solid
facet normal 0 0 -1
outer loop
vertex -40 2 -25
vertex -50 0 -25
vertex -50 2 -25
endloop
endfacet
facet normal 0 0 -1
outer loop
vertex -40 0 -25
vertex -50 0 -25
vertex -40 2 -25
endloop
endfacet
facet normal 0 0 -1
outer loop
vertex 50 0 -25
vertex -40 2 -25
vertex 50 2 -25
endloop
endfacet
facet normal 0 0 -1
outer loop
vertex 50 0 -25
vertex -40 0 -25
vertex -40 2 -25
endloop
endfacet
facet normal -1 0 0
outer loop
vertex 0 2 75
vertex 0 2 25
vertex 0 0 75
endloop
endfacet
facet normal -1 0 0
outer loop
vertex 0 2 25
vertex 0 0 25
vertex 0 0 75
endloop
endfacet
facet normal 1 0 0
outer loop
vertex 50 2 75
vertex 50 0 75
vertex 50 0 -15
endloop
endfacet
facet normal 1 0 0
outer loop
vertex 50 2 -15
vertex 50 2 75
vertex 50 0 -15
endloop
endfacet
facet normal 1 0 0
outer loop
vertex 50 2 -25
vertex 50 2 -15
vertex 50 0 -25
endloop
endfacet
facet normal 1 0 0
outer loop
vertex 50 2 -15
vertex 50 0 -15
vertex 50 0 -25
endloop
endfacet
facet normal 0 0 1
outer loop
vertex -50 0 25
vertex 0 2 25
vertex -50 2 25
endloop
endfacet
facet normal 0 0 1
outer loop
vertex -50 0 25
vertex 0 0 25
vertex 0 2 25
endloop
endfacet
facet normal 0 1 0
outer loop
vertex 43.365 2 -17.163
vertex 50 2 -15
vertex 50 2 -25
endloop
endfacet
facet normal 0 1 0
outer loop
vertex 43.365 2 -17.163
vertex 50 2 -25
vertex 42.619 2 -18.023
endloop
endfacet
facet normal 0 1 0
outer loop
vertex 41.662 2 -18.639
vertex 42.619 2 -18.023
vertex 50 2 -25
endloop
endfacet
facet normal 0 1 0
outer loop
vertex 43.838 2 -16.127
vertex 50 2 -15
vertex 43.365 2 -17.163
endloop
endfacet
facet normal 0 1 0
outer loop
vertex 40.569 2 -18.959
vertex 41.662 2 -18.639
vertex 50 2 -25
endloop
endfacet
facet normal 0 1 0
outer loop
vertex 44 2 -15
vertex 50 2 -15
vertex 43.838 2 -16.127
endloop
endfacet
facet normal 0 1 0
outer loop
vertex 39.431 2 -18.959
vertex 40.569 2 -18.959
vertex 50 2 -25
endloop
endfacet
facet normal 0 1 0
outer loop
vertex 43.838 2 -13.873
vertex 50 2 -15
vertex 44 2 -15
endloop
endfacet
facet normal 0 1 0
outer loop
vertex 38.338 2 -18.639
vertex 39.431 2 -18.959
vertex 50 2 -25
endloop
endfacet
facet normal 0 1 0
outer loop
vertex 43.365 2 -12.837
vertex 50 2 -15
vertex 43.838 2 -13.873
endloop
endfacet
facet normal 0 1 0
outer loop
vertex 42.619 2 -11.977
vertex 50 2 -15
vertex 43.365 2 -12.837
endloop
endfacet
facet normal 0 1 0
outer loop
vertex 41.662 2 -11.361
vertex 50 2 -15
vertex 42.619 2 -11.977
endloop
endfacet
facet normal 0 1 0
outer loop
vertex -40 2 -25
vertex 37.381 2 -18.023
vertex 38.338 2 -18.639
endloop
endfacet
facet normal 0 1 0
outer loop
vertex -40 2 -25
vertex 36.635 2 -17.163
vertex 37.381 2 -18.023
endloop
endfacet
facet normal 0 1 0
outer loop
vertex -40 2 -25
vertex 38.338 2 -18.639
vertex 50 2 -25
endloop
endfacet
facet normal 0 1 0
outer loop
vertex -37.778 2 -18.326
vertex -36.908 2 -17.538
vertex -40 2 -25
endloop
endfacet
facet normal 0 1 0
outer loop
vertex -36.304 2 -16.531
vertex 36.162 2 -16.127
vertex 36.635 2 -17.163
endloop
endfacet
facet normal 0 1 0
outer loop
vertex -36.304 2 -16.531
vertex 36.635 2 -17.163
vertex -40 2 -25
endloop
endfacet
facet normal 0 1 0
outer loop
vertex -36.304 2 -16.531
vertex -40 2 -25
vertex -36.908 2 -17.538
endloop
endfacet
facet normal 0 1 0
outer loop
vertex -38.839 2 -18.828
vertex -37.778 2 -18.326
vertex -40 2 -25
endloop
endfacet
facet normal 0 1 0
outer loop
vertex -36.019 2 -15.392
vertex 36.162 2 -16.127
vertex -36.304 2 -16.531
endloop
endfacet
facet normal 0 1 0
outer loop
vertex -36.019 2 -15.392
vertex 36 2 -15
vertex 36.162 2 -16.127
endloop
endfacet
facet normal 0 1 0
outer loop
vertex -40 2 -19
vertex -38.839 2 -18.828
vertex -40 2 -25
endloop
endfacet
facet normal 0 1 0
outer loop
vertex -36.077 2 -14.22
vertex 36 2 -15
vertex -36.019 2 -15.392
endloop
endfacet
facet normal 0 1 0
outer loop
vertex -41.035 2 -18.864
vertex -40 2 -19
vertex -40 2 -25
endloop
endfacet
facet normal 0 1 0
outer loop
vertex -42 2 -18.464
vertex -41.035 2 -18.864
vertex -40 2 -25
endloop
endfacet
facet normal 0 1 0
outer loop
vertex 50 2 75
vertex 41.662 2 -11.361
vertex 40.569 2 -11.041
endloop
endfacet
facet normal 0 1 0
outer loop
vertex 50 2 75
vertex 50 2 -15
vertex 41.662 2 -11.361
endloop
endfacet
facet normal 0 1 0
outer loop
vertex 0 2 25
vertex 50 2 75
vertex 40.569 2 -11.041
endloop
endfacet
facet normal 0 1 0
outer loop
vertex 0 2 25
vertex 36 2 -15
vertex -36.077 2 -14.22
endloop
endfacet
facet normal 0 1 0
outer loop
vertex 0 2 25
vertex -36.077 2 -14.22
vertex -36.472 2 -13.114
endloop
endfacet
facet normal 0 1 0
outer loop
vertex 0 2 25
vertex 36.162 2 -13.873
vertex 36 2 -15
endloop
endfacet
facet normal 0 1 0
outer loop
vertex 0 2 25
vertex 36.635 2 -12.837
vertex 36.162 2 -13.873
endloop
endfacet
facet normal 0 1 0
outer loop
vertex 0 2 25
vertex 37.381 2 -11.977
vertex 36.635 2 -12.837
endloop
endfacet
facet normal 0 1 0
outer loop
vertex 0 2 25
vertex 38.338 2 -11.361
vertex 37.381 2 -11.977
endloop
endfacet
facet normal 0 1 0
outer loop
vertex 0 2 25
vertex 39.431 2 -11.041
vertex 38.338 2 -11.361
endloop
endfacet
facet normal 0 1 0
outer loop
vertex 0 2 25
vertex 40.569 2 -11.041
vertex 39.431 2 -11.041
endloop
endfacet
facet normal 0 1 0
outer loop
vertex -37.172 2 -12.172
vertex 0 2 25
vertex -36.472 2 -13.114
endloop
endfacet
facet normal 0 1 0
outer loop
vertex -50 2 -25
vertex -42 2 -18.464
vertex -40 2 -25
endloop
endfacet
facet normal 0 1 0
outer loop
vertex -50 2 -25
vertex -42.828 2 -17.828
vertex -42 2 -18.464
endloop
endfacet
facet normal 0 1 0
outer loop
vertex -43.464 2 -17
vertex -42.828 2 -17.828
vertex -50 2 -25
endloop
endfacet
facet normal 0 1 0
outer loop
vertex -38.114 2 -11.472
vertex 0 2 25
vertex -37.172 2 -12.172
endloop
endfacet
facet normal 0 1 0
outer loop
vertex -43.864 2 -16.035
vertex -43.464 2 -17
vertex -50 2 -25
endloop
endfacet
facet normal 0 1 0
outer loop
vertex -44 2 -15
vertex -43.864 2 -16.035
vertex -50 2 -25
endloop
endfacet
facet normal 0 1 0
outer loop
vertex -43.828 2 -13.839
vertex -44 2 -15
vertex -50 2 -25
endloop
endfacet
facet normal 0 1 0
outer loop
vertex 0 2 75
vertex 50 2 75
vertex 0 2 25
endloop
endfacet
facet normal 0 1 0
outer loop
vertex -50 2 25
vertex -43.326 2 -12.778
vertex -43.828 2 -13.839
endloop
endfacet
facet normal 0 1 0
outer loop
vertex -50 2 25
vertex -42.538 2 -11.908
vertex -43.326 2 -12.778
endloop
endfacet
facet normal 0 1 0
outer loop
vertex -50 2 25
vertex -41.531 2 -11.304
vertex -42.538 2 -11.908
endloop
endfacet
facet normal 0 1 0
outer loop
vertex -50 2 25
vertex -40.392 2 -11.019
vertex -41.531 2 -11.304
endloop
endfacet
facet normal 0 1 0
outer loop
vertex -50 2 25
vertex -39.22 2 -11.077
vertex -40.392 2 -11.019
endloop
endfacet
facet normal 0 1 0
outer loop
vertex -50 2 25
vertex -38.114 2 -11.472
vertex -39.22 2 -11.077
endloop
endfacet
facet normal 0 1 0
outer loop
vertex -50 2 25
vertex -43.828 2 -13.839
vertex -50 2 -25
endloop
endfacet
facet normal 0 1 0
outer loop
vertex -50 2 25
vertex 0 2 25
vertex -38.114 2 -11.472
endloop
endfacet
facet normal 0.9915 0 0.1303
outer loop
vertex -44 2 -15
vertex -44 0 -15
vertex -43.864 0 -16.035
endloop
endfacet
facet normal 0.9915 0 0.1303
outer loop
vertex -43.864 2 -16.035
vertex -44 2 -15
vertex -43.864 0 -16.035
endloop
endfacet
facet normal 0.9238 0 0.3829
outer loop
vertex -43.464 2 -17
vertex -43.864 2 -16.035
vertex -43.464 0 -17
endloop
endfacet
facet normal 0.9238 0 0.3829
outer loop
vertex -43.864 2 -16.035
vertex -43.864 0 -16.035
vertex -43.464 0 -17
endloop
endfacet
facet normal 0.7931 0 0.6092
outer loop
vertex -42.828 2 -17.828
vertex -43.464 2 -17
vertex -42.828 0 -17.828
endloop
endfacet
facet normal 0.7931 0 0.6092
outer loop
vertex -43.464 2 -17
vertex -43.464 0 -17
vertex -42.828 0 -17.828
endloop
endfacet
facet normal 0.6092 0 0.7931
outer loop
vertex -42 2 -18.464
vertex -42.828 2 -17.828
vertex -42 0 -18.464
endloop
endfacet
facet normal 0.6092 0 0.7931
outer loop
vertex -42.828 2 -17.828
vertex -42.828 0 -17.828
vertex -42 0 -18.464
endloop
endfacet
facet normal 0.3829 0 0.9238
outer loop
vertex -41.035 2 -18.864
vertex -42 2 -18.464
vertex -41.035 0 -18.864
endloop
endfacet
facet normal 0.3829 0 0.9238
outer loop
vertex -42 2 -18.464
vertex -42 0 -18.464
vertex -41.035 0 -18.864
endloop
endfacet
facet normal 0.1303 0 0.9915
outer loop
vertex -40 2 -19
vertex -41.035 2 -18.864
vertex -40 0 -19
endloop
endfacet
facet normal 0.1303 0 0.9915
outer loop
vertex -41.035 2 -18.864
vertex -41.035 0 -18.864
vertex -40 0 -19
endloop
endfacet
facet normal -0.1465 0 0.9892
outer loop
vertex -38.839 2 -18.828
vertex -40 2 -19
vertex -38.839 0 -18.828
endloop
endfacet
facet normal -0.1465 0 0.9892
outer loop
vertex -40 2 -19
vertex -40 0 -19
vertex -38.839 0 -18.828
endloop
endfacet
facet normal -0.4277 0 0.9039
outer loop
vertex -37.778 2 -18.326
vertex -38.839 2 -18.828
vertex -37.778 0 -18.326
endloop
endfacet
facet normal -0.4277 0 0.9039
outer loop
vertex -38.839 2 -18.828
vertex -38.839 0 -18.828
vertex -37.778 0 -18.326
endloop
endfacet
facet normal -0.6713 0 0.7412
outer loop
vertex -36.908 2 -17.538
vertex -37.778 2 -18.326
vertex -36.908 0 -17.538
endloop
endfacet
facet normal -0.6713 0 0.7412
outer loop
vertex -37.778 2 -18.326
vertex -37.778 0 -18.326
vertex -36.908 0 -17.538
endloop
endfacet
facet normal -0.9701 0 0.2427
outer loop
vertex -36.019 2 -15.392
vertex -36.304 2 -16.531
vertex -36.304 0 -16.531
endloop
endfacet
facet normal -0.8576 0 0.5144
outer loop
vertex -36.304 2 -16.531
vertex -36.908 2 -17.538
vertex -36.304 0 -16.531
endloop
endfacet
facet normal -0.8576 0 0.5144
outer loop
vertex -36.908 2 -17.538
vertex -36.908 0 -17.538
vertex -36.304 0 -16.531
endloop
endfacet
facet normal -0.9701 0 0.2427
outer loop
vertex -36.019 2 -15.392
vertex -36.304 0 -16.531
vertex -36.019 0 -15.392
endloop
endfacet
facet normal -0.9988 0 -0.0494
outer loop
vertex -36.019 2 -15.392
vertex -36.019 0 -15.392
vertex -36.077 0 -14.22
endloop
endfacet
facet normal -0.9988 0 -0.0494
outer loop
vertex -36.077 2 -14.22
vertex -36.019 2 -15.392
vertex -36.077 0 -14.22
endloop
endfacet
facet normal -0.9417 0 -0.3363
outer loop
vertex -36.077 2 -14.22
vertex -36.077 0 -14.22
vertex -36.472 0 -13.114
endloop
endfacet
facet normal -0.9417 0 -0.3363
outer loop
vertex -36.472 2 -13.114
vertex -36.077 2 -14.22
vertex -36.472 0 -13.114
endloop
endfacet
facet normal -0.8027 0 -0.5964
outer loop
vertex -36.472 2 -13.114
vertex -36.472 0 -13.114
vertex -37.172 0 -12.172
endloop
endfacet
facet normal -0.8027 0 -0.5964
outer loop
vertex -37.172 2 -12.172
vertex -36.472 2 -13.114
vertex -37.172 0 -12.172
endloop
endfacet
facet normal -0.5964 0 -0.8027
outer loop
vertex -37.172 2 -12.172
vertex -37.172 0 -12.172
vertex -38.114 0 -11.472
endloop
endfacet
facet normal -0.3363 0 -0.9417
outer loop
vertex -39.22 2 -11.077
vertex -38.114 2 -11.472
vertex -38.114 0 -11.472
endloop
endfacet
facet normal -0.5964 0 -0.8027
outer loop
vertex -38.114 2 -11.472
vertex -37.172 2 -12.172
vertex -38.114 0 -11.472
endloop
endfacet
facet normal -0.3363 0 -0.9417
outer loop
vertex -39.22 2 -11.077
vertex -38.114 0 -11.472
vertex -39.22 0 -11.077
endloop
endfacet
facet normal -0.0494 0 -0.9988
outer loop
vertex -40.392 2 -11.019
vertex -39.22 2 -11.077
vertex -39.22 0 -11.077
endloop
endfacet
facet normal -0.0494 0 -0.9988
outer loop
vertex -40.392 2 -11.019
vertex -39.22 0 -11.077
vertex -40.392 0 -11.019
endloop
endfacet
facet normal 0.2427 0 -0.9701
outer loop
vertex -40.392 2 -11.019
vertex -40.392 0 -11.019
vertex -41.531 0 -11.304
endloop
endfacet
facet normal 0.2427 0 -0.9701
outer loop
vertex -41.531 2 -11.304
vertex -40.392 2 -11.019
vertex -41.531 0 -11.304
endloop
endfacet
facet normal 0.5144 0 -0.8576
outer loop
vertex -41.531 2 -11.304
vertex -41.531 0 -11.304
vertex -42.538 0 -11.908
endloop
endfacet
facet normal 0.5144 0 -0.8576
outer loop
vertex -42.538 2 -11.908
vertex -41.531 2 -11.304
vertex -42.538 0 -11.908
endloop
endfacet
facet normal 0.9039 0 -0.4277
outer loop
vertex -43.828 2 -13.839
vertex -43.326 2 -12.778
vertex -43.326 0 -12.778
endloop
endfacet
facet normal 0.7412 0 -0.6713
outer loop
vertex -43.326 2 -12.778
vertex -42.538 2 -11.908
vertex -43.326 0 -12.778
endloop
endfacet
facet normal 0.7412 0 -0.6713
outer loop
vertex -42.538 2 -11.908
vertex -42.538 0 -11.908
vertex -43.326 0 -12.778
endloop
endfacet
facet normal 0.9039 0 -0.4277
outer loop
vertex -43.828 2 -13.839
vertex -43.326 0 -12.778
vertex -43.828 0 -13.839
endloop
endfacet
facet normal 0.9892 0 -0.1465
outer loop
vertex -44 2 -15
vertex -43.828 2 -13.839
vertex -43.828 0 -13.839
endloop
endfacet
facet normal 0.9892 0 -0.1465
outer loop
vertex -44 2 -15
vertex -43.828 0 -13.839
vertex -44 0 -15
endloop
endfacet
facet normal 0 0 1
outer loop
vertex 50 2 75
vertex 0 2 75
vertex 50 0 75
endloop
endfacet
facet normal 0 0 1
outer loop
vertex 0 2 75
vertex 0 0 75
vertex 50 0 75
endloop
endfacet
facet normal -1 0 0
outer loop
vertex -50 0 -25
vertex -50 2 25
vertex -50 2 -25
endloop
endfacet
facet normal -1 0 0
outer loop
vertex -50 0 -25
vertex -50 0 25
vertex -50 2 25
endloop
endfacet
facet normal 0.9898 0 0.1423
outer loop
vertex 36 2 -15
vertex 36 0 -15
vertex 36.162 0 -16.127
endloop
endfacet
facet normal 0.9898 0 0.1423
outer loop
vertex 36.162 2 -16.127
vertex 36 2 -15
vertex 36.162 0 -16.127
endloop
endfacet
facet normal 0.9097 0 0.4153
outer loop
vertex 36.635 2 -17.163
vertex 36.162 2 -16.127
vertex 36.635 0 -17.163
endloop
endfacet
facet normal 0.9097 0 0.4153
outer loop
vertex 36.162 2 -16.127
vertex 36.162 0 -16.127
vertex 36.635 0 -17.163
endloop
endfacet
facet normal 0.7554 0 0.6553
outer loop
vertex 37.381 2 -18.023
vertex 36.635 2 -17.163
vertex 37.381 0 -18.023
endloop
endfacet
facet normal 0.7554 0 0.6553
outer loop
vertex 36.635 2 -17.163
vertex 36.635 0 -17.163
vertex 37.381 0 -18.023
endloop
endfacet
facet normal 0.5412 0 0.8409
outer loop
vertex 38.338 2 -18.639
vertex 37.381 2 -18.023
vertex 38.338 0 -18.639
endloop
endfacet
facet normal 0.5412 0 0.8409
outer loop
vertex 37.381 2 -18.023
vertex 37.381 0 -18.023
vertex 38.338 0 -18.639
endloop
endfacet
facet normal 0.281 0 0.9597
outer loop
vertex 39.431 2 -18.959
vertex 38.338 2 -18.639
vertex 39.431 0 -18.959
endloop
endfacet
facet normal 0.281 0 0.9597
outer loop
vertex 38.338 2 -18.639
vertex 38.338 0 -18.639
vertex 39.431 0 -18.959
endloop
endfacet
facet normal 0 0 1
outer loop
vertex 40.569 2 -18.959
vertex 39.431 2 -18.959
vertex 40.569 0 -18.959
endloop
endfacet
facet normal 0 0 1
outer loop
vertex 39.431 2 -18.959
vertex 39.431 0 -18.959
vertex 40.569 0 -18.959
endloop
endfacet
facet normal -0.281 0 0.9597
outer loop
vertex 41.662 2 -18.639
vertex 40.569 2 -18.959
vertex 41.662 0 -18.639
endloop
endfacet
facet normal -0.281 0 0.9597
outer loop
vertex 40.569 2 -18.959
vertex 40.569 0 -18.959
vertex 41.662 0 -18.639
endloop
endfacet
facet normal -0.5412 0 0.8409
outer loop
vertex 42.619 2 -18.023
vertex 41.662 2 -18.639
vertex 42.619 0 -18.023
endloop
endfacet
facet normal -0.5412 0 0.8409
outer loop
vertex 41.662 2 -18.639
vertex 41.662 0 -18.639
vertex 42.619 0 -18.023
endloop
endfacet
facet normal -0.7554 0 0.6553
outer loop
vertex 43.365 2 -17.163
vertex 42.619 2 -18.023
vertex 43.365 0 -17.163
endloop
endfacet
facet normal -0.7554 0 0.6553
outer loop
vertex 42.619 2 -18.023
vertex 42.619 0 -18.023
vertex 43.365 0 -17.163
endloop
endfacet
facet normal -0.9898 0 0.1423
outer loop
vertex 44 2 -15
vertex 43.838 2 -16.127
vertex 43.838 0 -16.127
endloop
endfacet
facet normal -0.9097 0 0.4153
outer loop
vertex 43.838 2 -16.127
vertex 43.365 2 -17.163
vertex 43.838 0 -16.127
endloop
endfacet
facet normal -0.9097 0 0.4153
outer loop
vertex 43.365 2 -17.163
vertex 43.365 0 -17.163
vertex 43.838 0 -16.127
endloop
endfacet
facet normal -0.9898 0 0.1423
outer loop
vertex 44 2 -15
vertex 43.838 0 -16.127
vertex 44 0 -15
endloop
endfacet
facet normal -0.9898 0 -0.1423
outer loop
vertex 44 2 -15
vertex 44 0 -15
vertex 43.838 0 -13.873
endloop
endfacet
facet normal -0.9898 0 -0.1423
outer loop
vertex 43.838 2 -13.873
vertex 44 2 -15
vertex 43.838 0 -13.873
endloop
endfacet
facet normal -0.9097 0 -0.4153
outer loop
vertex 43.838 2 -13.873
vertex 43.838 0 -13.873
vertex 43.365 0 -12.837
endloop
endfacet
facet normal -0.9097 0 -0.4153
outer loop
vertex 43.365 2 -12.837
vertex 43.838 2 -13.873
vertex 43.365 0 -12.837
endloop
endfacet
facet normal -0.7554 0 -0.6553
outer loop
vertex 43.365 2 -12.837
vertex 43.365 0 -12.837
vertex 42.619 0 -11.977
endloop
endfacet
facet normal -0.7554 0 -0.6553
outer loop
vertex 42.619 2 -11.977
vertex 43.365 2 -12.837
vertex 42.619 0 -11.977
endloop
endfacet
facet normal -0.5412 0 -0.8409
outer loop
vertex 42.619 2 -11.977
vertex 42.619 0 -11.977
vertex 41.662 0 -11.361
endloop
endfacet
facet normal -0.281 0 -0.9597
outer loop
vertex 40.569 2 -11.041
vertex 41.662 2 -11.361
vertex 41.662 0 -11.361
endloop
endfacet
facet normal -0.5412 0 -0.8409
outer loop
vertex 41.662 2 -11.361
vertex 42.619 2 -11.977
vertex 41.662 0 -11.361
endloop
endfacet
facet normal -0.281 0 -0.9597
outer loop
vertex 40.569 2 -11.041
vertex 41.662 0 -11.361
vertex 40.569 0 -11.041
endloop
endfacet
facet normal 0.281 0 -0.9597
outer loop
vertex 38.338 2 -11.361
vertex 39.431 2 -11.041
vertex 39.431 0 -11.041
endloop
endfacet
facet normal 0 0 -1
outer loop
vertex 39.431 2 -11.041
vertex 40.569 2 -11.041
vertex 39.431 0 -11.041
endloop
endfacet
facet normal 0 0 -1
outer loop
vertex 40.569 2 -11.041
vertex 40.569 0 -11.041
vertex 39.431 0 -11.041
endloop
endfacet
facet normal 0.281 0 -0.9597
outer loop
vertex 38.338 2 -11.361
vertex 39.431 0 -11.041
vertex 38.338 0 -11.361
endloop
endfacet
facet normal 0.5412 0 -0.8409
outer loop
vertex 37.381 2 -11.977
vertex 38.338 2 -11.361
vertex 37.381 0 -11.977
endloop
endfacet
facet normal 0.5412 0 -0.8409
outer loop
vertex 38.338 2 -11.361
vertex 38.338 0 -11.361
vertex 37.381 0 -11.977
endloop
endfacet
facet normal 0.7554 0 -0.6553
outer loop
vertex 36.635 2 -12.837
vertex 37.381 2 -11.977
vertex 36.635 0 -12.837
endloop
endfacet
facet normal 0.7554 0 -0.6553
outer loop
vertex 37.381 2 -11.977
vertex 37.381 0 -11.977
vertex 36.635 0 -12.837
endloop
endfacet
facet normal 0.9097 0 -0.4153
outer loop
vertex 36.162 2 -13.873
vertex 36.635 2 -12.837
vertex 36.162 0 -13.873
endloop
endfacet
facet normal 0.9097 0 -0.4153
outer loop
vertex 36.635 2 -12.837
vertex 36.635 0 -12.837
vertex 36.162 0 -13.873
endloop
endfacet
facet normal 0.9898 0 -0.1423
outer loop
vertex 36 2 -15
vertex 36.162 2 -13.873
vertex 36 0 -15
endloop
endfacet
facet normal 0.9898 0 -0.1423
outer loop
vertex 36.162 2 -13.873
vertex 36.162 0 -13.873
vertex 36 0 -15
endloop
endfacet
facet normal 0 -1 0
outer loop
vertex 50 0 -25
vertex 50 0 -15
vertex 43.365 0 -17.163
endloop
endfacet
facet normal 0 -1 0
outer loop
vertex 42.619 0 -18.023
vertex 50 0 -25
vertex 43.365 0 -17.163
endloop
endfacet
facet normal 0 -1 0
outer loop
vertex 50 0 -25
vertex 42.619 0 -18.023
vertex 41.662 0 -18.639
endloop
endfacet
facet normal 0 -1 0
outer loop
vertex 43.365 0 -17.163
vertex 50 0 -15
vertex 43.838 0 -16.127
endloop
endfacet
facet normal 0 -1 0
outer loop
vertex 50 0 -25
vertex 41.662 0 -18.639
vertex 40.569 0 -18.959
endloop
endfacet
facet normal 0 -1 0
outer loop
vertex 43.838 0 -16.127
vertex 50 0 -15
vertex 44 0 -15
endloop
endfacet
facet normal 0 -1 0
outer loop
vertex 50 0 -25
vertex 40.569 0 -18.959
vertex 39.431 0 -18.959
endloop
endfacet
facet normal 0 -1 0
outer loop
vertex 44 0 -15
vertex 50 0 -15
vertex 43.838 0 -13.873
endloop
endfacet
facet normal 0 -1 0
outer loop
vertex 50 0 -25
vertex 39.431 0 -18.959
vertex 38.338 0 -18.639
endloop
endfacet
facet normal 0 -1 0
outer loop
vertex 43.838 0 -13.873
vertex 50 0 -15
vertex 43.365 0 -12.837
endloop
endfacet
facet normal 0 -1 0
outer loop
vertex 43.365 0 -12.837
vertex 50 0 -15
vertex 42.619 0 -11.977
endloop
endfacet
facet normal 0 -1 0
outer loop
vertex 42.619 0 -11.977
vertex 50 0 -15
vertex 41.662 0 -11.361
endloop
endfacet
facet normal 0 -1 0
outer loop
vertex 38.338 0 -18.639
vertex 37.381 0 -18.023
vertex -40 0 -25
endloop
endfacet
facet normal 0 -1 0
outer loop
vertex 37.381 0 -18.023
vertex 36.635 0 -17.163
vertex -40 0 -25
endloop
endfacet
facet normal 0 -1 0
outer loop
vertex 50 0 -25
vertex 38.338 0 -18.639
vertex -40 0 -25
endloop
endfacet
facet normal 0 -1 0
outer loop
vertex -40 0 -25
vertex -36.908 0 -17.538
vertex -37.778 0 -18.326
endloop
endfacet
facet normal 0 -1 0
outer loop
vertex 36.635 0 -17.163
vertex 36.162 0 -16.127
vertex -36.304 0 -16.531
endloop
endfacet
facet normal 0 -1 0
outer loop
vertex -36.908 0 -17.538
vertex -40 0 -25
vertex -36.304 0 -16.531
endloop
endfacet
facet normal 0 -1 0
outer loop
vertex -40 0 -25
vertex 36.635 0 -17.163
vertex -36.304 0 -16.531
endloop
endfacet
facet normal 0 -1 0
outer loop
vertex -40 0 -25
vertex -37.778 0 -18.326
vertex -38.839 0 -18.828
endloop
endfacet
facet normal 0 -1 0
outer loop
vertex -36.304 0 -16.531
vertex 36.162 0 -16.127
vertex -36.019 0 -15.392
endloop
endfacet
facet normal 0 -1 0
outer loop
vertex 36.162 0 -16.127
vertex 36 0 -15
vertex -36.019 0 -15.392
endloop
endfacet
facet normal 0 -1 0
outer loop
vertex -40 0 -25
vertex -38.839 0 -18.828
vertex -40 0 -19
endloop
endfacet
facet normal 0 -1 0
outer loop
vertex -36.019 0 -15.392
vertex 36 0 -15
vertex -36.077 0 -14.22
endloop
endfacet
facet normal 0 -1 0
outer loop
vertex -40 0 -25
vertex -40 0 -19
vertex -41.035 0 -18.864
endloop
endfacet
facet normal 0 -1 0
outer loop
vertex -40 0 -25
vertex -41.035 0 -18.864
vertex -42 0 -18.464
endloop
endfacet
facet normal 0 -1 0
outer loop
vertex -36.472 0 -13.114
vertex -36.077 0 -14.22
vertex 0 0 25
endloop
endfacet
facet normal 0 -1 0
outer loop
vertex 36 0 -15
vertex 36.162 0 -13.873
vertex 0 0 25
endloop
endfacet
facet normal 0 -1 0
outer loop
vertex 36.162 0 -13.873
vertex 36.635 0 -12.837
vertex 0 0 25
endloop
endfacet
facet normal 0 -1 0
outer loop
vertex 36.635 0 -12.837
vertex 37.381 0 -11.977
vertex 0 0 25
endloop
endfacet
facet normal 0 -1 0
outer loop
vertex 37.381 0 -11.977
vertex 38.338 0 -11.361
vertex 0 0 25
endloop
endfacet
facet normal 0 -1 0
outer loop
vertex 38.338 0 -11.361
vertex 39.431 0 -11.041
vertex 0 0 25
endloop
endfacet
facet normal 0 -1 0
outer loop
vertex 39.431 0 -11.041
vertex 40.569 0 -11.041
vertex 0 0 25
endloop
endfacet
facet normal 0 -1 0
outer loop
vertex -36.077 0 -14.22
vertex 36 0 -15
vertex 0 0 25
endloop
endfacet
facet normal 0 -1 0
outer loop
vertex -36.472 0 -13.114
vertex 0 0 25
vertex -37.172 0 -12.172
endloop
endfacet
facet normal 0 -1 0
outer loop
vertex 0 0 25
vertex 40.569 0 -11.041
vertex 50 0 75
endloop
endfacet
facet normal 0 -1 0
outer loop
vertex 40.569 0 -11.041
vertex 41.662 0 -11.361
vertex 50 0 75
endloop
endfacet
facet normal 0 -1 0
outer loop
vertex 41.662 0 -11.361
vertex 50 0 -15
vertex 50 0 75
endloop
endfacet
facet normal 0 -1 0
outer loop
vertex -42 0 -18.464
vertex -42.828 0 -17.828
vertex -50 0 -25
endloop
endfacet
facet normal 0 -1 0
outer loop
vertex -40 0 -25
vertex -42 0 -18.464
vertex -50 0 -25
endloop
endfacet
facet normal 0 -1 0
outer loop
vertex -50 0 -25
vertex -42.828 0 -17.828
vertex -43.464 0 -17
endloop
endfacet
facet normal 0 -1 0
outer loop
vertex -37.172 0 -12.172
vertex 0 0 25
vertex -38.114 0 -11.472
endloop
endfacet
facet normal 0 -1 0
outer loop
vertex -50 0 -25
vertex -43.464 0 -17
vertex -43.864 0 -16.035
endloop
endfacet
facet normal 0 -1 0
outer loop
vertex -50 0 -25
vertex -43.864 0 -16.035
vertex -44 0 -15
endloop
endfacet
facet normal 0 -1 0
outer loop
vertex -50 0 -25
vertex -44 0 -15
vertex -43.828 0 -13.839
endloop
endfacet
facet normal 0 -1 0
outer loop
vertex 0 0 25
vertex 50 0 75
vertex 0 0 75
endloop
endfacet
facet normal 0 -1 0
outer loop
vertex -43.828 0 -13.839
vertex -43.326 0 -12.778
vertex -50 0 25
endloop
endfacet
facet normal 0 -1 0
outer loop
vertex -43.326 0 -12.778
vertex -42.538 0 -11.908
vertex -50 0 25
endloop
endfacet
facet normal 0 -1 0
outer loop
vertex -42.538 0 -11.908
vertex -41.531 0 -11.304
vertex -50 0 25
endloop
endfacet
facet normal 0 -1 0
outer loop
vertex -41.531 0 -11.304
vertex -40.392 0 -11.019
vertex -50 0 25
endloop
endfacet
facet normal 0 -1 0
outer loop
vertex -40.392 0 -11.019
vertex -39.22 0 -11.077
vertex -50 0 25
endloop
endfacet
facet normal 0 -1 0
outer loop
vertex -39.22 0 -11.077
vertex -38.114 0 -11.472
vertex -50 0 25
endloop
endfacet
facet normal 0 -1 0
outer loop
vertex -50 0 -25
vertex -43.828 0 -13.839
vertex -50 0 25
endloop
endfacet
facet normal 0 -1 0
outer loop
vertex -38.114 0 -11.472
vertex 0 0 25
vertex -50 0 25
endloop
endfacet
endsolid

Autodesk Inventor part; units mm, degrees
ref_plane "YZ Plane" through (0, 0, 0) normal (1, 0, 0) x (0, 1, 0)
ref_plane "XZ Plane" through (0, 0, 0) normal (0, 1, 0) x (-1, 0, 0)
ref_plane "XY Plane" through (0, 0, 0) normal (0, 0, 1) x (1, 0, 0)
sketch "Sketch1" plane through (0, 0, 0) normal (0, 1, 0) x (-1, 0, 0)
  line L0 (-50, 25) -> (50, 25)
  line L1 (50, 25) -> (50, -25)
  line L2 (50, -25) -> (-50, -25)
  line L3 (-50, -25) -> (-50, 25)
  line L4 (-50, 25) -> (0, 25)
  line L5 (0, 25) -> (0, 75)
  line L6 (0, 75) -> (-50, 75)
  line L7 (-50, 75) -> (-50, 25)
  line L8 (50, -25) -> (40, -25)
  line L9 (40, -25) -> (40, -15)
  line L10 (-50, -25) -> (-50, -15)
  line L11 (-50, -15) -> (-40, -15)
  circle A0 centre (40, -15) radius 4
  circle A1 centre (-40, -15) radius 4
  point P0 (0, 0)
  point P1 (0, 25)
  dimension "d0" = 100
  dimension "d1" = 50
  dimension "d2" = 50
  dimension "d3" = 50
  dimension "d4" = 10
  dimension "d5" = 10
  dimension "d6" = 10
  dimension "d7" = 10
  dimension "d8" = 8
  dimension "d9" = 8
  dimension "d12" = 90
  dimension "d13" = 90
extrude "Extrusion1" add sketch "Sketch1" along normal blind 2
properties part number "Pinz"
